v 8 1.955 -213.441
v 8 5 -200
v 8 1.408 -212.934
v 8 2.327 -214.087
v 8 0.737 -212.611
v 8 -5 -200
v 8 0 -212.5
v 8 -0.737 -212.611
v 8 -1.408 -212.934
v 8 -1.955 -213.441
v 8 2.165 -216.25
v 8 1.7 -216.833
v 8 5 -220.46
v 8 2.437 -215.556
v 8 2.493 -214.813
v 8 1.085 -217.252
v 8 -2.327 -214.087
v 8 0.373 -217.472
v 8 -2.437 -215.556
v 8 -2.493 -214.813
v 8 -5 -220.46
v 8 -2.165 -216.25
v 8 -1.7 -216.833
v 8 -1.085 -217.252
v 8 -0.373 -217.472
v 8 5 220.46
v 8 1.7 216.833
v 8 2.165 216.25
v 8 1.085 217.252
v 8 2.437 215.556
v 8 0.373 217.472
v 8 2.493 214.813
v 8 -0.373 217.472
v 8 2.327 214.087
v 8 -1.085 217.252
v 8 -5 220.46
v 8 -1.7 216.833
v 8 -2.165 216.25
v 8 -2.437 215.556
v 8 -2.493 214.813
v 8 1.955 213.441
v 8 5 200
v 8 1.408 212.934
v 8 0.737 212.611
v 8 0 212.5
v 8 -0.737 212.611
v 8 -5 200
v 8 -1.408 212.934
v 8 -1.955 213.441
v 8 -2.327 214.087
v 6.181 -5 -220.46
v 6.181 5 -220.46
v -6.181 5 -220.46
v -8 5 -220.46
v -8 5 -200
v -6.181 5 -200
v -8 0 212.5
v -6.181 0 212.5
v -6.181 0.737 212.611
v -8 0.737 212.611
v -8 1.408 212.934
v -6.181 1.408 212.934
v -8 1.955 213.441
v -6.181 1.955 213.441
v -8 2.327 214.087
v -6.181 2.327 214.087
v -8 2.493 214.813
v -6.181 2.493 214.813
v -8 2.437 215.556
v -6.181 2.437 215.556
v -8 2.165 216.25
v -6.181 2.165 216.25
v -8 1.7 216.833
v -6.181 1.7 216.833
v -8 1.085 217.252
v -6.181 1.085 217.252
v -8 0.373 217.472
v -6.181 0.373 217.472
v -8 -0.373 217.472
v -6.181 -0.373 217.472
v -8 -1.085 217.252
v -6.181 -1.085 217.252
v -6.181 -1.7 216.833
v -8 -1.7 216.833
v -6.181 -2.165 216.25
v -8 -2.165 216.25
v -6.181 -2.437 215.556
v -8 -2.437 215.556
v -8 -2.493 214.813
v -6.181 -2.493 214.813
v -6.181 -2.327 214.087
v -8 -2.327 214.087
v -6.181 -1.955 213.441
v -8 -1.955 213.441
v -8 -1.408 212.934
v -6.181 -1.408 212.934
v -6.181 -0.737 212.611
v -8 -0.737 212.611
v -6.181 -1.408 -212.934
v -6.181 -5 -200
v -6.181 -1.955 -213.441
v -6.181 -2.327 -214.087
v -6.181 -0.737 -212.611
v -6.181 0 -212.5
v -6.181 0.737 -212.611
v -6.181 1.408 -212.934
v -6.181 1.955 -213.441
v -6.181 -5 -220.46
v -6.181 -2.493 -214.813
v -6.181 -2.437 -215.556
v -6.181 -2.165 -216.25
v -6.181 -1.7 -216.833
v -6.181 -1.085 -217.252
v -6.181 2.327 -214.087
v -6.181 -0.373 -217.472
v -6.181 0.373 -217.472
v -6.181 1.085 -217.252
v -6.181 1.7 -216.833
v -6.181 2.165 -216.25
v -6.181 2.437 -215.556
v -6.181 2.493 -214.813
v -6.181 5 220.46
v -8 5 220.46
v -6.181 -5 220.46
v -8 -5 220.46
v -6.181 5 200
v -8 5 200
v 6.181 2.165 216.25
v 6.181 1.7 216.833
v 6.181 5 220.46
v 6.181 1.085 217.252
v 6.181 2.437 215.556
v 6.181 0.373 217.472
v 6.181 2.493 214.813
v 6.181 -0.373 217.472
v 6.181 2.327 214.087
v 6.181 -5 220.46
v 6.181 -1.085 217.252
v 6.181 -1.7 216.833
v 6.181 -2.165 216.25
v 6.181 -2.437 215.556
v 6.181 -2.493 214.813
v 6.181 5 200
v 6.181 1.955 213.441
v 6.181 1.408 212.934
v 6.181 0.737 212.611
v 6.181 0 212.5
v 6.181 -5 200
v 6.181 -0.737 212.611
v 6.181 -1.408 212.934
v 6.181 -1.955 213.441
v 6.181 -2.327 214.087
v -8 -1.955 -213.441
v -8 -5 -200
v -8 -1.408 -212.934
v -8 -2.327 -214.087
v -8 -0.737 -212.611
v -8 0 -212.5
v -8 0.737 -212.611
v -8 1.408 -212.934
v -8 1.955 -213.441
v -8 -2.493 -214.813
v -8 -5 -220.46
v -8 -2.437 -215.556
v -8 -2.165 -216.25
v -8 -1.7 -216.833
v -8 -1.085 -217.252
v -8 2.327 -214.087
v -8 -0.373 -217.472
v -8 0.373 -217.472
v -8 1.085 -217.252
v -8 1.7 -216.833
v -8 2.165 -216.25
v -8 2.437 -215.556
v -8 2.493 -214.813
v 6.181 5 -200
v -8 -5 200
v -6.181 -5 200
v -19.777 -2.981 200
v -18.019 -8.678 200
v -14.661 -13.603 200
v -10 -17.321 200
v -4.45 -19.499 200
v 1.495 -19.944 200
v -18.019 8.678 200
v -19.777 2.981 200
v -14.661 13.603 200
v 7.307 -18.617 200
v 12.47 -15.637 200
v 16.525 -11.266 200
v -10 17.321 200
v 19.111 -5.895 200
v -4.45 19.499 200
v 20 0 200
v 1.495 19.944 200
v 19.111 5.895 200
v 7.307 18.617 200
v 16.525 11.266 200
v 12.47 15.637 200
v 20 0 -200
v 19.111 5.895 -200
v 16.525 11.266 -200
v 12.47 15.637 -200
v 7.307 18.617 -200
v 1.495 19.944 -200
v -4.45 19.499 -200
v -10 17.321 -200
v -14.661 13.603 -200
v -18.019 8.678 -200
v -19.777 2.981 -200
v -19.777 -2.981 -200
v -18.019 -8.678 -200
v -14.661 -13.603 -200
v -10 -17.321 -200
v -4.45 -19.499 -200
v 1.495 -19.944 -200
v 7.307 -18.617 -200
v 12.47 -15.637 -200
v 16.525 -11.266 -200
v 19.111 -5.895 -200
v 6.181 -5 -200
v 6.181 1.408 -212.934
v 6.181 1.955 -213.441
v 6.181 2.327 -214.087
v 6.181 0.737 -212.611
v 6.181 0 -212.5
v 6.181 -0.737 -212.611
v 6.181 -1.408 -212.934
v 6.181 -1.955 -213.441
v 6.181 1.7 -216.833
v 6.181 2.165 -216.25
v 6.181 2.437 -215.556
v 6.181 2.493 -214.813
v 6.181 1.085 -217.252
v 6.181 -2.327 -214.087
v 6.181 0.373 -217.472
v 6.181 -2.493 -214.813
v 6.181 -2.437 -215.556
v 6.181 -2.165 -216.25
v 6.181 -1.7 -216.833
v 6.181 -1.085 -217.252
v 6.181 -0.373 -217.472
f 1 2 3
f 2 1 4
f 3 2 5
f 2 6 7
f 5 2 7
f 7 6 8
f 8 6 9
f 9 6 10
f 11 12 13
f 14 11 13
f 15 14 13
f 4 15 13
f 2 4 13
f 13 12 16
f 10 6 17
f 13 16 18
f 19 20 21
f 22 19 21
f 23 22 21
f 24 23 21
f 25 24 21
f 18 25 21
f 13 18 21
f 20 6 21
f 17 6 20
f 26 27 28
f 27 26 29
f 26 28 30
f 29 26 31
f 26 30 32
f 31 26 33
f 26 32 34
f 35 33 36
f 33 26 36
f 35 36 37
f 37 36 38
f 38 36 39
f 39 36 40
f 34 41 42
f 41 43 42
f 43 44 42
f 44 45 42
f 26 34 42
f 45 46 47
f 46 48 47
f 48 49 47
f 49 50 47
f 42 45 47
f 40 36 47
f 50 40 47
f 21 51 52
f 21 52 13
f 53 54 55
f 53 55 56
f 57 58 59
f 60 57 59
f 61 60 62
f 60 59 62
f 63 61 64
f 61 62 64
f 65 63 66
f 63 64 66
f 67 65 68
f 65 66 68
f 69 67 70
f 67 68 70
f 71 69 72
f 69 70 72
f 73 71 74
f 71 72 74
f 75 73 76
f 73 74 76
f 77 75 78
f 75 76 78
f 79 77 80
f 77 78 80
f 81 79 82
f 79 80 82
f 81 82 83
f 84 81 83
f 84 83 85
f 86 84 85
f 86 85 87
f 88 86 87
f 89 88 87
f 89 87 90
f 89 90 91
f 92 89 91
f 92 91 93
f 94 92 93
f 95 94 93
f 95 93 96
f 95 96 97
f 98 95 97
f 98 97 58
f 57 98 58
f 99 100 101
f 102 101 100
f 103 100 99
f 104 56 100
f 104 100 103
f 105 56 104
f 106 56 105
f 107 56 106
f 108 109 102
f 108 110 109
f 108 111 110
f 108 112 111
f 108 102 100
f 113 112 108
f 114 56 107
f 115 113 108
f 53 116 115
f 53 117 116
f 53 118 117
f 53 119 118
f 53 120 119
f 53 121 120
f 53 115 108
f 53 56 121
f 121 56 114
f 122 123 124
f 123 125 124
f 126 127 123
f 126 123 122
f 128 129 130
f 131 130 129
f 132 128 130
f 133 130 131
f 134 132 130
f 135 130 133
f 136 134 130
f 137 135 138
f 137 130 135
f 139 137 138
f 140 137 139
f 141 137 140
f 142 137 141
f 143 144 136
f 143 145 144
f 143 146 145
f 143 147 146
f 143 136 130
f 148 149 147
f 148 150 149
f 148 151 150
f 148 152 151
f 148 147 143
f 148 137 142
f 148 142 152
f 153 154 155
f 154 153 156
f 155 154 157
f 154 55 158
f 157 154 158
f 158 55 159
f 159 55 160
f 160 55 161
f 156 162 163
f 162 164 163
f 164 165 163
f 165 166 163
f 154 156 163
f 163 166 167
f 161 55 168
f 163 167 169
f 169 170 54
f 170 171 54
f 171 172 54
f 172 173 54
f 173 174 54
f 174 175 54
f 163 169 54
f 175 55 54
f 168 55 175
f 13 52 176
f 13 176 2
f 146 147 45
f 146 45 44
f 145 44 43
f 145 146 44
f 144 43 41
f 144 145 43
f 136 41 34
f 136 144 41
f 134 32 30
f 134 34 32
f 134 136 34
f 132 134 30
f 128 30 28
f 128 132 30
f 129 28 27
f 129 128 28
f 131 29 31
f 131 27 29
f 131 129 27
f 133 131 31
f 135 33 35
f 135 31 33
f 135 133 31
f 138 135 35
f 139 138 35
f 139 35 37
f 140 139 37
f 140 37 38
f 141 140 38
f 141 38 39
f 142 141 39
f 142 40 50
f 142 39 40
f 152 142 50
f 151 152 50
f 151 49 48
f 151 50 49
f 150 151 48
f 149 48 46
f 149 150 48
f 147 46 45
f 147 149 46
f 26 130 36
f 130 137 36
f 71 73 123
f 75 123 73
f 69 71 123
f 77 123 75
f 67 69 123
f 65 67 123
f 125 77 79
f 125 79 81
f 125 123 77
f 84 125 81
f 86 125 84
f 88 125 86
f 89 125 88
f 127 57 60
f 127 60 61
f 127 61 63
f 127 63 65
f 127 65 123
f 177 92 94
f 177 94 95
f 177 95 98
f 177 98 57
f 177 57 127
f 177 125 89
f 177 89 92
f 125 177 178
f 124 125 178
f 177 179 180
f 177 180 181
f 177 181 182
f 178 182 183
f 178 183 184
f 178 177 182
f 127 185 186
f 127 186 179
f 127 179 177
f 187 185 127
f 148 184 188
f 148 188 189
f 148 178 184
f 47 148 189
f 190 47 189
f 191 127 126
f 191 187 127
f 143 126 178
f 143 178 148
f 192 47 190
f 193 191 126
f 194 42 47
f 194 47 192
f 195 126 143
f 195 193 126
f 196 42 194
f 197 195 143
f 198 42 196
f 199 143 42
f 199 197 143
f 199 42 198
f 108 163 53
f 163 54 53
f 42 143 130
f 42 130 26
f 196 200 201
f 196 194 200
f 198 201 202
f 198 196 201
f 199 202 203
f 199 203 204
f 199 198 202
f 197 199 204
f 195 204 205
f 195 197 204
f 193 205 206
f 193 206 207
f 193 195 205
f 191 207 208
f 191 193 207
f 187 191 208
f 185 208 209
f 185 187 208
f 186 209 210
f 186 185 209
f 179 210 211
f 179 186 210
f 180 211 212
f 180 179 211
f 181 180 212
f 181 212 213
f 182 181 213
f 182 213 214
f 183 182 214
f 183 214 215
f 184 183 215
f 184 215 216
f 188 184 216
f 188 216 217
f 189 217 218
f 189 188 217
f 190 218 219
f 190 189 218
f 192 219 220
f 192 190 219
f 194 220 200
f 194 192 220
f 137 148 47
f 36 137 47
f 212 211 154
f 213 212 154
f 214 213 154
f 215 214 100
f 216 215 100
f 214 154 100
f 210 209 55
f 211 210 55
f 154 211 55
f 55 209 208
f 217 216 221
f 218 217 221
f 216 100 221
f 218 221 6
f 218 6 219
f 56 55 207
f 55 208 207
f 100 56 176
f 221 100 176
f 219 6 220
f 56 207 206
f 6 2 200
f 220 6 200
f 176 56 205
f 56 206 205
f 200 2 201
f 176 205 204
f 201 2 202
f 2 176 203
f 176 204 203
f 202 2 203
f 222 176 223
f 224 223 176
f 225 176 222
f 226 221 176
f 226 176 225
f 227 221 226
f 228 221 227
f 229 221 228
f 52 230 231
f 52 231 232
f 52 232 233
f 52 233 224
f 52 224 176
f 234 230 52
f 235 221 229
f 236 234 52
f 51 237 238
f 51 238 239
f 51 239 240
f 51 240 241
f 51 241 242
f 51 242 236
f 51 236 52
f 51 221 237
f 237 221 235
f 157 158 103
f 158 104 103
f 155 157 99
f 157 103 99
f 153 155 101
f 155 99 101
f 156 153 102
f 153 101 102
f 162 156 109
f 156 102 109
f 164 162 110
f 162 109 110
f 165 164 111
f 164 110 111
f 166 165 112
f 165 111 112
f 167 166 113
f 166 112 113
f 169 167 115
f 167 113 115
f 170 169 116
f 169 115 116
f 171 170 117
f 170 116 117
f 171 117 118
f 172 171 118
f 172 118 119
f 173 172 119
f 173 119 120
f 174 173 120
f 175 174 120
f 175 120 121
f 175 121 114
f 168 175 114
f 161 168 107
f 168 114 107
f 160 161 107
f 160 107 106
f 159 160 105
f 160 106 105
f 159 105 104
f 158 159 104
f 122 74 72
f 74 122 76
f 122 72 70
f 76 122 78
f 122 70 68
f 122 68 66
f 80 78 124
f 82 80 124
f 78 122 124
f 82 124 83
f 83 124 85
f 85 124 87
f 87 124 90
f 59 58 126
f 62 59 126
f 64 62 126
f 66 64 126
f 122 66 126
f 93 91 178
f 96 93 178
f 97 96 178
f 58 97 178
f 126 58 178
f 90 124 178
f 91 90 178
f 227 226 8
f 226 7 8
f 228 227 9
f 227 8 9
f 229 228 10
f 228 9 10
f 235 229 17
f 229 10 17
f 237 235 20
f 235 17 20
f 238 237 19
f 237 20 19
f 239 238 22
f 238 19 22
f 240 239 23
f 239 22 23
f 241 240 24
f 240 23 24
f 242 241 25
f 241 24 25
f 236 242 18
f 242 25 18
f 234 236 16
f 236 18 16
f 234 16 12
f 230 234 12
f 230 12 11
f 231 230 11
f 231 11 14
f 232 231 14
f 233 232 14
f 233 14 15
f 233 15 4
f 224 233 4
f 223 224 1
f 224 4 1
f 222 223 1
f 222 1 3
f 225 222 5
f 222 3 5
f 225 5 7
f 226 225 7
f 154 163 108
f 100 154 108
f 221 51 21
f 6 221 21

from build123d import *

# Parameters (mm, degrees)
SKETCH1_R           = 20
BOSS_EXTRUDE1_DEPTH = 200
SKETCH2_W           = 1.819488692
SKETCH2_H           = 20.46
BOSS_EXTRUDE2_DEPTH = 5
SKETCH3_R           = 2.5
CUT_EXTRUDE1_DEPTH  = 9


with BuildPart() as part:
    # Sketch1 → Boss-Extrude1 (new, symmetric)
    with BuildSketch(Plane.XY):
        Circle(SKETCH1_R)
    extrude(amount=BOSS_EXTRUDE1_DEPTH, both=True)

    # Sketch2 → Boss-Extrude2 (add, symmetric)
    with BuildSketch(Plane(origin=(0, 0, 0), x_dir=(1, 0, 0), z_dir=(0, 1, 0))):
        with Locations((7.090255654, -210.23)):
            Rectangle(SKETCH2_W, SKETCH2_H)
        with Locations((-7.090255654, -210.23)):
            Rectangle(SKETCH2_W, SKETCH2_H)
        with Locations((7.090255654, 210.23)):
            Rectangle(SKETCH2_W, SKETCH2_H)
        with Locations((-7.090255654, 210.23)):
            Rectangle(SKETCH2_W, SKETCH2_H)
    extrude(amount=BOSS_EXTRUDE2_DEPTH, both=True)

    # Sketch3 → Cut-Extrude1 (cut, symmetric)
    with BuildSketch(Plane(origin=(0, 0, 0), x_dir=(0, 0, -1), z_dir=(1, 0, 0))):
        with Locations((-215, 0)):
            Circle(SKETCH3_R)
        with Locations(Location((215, 0, 0), (0, 0, 180))):
            Circle(SKETCH3_R)
    extrude(amount=CUT_EXTRUDE1_DEPTH, both=True, mode=Mode.SUBTRACT)


solid = part.part
